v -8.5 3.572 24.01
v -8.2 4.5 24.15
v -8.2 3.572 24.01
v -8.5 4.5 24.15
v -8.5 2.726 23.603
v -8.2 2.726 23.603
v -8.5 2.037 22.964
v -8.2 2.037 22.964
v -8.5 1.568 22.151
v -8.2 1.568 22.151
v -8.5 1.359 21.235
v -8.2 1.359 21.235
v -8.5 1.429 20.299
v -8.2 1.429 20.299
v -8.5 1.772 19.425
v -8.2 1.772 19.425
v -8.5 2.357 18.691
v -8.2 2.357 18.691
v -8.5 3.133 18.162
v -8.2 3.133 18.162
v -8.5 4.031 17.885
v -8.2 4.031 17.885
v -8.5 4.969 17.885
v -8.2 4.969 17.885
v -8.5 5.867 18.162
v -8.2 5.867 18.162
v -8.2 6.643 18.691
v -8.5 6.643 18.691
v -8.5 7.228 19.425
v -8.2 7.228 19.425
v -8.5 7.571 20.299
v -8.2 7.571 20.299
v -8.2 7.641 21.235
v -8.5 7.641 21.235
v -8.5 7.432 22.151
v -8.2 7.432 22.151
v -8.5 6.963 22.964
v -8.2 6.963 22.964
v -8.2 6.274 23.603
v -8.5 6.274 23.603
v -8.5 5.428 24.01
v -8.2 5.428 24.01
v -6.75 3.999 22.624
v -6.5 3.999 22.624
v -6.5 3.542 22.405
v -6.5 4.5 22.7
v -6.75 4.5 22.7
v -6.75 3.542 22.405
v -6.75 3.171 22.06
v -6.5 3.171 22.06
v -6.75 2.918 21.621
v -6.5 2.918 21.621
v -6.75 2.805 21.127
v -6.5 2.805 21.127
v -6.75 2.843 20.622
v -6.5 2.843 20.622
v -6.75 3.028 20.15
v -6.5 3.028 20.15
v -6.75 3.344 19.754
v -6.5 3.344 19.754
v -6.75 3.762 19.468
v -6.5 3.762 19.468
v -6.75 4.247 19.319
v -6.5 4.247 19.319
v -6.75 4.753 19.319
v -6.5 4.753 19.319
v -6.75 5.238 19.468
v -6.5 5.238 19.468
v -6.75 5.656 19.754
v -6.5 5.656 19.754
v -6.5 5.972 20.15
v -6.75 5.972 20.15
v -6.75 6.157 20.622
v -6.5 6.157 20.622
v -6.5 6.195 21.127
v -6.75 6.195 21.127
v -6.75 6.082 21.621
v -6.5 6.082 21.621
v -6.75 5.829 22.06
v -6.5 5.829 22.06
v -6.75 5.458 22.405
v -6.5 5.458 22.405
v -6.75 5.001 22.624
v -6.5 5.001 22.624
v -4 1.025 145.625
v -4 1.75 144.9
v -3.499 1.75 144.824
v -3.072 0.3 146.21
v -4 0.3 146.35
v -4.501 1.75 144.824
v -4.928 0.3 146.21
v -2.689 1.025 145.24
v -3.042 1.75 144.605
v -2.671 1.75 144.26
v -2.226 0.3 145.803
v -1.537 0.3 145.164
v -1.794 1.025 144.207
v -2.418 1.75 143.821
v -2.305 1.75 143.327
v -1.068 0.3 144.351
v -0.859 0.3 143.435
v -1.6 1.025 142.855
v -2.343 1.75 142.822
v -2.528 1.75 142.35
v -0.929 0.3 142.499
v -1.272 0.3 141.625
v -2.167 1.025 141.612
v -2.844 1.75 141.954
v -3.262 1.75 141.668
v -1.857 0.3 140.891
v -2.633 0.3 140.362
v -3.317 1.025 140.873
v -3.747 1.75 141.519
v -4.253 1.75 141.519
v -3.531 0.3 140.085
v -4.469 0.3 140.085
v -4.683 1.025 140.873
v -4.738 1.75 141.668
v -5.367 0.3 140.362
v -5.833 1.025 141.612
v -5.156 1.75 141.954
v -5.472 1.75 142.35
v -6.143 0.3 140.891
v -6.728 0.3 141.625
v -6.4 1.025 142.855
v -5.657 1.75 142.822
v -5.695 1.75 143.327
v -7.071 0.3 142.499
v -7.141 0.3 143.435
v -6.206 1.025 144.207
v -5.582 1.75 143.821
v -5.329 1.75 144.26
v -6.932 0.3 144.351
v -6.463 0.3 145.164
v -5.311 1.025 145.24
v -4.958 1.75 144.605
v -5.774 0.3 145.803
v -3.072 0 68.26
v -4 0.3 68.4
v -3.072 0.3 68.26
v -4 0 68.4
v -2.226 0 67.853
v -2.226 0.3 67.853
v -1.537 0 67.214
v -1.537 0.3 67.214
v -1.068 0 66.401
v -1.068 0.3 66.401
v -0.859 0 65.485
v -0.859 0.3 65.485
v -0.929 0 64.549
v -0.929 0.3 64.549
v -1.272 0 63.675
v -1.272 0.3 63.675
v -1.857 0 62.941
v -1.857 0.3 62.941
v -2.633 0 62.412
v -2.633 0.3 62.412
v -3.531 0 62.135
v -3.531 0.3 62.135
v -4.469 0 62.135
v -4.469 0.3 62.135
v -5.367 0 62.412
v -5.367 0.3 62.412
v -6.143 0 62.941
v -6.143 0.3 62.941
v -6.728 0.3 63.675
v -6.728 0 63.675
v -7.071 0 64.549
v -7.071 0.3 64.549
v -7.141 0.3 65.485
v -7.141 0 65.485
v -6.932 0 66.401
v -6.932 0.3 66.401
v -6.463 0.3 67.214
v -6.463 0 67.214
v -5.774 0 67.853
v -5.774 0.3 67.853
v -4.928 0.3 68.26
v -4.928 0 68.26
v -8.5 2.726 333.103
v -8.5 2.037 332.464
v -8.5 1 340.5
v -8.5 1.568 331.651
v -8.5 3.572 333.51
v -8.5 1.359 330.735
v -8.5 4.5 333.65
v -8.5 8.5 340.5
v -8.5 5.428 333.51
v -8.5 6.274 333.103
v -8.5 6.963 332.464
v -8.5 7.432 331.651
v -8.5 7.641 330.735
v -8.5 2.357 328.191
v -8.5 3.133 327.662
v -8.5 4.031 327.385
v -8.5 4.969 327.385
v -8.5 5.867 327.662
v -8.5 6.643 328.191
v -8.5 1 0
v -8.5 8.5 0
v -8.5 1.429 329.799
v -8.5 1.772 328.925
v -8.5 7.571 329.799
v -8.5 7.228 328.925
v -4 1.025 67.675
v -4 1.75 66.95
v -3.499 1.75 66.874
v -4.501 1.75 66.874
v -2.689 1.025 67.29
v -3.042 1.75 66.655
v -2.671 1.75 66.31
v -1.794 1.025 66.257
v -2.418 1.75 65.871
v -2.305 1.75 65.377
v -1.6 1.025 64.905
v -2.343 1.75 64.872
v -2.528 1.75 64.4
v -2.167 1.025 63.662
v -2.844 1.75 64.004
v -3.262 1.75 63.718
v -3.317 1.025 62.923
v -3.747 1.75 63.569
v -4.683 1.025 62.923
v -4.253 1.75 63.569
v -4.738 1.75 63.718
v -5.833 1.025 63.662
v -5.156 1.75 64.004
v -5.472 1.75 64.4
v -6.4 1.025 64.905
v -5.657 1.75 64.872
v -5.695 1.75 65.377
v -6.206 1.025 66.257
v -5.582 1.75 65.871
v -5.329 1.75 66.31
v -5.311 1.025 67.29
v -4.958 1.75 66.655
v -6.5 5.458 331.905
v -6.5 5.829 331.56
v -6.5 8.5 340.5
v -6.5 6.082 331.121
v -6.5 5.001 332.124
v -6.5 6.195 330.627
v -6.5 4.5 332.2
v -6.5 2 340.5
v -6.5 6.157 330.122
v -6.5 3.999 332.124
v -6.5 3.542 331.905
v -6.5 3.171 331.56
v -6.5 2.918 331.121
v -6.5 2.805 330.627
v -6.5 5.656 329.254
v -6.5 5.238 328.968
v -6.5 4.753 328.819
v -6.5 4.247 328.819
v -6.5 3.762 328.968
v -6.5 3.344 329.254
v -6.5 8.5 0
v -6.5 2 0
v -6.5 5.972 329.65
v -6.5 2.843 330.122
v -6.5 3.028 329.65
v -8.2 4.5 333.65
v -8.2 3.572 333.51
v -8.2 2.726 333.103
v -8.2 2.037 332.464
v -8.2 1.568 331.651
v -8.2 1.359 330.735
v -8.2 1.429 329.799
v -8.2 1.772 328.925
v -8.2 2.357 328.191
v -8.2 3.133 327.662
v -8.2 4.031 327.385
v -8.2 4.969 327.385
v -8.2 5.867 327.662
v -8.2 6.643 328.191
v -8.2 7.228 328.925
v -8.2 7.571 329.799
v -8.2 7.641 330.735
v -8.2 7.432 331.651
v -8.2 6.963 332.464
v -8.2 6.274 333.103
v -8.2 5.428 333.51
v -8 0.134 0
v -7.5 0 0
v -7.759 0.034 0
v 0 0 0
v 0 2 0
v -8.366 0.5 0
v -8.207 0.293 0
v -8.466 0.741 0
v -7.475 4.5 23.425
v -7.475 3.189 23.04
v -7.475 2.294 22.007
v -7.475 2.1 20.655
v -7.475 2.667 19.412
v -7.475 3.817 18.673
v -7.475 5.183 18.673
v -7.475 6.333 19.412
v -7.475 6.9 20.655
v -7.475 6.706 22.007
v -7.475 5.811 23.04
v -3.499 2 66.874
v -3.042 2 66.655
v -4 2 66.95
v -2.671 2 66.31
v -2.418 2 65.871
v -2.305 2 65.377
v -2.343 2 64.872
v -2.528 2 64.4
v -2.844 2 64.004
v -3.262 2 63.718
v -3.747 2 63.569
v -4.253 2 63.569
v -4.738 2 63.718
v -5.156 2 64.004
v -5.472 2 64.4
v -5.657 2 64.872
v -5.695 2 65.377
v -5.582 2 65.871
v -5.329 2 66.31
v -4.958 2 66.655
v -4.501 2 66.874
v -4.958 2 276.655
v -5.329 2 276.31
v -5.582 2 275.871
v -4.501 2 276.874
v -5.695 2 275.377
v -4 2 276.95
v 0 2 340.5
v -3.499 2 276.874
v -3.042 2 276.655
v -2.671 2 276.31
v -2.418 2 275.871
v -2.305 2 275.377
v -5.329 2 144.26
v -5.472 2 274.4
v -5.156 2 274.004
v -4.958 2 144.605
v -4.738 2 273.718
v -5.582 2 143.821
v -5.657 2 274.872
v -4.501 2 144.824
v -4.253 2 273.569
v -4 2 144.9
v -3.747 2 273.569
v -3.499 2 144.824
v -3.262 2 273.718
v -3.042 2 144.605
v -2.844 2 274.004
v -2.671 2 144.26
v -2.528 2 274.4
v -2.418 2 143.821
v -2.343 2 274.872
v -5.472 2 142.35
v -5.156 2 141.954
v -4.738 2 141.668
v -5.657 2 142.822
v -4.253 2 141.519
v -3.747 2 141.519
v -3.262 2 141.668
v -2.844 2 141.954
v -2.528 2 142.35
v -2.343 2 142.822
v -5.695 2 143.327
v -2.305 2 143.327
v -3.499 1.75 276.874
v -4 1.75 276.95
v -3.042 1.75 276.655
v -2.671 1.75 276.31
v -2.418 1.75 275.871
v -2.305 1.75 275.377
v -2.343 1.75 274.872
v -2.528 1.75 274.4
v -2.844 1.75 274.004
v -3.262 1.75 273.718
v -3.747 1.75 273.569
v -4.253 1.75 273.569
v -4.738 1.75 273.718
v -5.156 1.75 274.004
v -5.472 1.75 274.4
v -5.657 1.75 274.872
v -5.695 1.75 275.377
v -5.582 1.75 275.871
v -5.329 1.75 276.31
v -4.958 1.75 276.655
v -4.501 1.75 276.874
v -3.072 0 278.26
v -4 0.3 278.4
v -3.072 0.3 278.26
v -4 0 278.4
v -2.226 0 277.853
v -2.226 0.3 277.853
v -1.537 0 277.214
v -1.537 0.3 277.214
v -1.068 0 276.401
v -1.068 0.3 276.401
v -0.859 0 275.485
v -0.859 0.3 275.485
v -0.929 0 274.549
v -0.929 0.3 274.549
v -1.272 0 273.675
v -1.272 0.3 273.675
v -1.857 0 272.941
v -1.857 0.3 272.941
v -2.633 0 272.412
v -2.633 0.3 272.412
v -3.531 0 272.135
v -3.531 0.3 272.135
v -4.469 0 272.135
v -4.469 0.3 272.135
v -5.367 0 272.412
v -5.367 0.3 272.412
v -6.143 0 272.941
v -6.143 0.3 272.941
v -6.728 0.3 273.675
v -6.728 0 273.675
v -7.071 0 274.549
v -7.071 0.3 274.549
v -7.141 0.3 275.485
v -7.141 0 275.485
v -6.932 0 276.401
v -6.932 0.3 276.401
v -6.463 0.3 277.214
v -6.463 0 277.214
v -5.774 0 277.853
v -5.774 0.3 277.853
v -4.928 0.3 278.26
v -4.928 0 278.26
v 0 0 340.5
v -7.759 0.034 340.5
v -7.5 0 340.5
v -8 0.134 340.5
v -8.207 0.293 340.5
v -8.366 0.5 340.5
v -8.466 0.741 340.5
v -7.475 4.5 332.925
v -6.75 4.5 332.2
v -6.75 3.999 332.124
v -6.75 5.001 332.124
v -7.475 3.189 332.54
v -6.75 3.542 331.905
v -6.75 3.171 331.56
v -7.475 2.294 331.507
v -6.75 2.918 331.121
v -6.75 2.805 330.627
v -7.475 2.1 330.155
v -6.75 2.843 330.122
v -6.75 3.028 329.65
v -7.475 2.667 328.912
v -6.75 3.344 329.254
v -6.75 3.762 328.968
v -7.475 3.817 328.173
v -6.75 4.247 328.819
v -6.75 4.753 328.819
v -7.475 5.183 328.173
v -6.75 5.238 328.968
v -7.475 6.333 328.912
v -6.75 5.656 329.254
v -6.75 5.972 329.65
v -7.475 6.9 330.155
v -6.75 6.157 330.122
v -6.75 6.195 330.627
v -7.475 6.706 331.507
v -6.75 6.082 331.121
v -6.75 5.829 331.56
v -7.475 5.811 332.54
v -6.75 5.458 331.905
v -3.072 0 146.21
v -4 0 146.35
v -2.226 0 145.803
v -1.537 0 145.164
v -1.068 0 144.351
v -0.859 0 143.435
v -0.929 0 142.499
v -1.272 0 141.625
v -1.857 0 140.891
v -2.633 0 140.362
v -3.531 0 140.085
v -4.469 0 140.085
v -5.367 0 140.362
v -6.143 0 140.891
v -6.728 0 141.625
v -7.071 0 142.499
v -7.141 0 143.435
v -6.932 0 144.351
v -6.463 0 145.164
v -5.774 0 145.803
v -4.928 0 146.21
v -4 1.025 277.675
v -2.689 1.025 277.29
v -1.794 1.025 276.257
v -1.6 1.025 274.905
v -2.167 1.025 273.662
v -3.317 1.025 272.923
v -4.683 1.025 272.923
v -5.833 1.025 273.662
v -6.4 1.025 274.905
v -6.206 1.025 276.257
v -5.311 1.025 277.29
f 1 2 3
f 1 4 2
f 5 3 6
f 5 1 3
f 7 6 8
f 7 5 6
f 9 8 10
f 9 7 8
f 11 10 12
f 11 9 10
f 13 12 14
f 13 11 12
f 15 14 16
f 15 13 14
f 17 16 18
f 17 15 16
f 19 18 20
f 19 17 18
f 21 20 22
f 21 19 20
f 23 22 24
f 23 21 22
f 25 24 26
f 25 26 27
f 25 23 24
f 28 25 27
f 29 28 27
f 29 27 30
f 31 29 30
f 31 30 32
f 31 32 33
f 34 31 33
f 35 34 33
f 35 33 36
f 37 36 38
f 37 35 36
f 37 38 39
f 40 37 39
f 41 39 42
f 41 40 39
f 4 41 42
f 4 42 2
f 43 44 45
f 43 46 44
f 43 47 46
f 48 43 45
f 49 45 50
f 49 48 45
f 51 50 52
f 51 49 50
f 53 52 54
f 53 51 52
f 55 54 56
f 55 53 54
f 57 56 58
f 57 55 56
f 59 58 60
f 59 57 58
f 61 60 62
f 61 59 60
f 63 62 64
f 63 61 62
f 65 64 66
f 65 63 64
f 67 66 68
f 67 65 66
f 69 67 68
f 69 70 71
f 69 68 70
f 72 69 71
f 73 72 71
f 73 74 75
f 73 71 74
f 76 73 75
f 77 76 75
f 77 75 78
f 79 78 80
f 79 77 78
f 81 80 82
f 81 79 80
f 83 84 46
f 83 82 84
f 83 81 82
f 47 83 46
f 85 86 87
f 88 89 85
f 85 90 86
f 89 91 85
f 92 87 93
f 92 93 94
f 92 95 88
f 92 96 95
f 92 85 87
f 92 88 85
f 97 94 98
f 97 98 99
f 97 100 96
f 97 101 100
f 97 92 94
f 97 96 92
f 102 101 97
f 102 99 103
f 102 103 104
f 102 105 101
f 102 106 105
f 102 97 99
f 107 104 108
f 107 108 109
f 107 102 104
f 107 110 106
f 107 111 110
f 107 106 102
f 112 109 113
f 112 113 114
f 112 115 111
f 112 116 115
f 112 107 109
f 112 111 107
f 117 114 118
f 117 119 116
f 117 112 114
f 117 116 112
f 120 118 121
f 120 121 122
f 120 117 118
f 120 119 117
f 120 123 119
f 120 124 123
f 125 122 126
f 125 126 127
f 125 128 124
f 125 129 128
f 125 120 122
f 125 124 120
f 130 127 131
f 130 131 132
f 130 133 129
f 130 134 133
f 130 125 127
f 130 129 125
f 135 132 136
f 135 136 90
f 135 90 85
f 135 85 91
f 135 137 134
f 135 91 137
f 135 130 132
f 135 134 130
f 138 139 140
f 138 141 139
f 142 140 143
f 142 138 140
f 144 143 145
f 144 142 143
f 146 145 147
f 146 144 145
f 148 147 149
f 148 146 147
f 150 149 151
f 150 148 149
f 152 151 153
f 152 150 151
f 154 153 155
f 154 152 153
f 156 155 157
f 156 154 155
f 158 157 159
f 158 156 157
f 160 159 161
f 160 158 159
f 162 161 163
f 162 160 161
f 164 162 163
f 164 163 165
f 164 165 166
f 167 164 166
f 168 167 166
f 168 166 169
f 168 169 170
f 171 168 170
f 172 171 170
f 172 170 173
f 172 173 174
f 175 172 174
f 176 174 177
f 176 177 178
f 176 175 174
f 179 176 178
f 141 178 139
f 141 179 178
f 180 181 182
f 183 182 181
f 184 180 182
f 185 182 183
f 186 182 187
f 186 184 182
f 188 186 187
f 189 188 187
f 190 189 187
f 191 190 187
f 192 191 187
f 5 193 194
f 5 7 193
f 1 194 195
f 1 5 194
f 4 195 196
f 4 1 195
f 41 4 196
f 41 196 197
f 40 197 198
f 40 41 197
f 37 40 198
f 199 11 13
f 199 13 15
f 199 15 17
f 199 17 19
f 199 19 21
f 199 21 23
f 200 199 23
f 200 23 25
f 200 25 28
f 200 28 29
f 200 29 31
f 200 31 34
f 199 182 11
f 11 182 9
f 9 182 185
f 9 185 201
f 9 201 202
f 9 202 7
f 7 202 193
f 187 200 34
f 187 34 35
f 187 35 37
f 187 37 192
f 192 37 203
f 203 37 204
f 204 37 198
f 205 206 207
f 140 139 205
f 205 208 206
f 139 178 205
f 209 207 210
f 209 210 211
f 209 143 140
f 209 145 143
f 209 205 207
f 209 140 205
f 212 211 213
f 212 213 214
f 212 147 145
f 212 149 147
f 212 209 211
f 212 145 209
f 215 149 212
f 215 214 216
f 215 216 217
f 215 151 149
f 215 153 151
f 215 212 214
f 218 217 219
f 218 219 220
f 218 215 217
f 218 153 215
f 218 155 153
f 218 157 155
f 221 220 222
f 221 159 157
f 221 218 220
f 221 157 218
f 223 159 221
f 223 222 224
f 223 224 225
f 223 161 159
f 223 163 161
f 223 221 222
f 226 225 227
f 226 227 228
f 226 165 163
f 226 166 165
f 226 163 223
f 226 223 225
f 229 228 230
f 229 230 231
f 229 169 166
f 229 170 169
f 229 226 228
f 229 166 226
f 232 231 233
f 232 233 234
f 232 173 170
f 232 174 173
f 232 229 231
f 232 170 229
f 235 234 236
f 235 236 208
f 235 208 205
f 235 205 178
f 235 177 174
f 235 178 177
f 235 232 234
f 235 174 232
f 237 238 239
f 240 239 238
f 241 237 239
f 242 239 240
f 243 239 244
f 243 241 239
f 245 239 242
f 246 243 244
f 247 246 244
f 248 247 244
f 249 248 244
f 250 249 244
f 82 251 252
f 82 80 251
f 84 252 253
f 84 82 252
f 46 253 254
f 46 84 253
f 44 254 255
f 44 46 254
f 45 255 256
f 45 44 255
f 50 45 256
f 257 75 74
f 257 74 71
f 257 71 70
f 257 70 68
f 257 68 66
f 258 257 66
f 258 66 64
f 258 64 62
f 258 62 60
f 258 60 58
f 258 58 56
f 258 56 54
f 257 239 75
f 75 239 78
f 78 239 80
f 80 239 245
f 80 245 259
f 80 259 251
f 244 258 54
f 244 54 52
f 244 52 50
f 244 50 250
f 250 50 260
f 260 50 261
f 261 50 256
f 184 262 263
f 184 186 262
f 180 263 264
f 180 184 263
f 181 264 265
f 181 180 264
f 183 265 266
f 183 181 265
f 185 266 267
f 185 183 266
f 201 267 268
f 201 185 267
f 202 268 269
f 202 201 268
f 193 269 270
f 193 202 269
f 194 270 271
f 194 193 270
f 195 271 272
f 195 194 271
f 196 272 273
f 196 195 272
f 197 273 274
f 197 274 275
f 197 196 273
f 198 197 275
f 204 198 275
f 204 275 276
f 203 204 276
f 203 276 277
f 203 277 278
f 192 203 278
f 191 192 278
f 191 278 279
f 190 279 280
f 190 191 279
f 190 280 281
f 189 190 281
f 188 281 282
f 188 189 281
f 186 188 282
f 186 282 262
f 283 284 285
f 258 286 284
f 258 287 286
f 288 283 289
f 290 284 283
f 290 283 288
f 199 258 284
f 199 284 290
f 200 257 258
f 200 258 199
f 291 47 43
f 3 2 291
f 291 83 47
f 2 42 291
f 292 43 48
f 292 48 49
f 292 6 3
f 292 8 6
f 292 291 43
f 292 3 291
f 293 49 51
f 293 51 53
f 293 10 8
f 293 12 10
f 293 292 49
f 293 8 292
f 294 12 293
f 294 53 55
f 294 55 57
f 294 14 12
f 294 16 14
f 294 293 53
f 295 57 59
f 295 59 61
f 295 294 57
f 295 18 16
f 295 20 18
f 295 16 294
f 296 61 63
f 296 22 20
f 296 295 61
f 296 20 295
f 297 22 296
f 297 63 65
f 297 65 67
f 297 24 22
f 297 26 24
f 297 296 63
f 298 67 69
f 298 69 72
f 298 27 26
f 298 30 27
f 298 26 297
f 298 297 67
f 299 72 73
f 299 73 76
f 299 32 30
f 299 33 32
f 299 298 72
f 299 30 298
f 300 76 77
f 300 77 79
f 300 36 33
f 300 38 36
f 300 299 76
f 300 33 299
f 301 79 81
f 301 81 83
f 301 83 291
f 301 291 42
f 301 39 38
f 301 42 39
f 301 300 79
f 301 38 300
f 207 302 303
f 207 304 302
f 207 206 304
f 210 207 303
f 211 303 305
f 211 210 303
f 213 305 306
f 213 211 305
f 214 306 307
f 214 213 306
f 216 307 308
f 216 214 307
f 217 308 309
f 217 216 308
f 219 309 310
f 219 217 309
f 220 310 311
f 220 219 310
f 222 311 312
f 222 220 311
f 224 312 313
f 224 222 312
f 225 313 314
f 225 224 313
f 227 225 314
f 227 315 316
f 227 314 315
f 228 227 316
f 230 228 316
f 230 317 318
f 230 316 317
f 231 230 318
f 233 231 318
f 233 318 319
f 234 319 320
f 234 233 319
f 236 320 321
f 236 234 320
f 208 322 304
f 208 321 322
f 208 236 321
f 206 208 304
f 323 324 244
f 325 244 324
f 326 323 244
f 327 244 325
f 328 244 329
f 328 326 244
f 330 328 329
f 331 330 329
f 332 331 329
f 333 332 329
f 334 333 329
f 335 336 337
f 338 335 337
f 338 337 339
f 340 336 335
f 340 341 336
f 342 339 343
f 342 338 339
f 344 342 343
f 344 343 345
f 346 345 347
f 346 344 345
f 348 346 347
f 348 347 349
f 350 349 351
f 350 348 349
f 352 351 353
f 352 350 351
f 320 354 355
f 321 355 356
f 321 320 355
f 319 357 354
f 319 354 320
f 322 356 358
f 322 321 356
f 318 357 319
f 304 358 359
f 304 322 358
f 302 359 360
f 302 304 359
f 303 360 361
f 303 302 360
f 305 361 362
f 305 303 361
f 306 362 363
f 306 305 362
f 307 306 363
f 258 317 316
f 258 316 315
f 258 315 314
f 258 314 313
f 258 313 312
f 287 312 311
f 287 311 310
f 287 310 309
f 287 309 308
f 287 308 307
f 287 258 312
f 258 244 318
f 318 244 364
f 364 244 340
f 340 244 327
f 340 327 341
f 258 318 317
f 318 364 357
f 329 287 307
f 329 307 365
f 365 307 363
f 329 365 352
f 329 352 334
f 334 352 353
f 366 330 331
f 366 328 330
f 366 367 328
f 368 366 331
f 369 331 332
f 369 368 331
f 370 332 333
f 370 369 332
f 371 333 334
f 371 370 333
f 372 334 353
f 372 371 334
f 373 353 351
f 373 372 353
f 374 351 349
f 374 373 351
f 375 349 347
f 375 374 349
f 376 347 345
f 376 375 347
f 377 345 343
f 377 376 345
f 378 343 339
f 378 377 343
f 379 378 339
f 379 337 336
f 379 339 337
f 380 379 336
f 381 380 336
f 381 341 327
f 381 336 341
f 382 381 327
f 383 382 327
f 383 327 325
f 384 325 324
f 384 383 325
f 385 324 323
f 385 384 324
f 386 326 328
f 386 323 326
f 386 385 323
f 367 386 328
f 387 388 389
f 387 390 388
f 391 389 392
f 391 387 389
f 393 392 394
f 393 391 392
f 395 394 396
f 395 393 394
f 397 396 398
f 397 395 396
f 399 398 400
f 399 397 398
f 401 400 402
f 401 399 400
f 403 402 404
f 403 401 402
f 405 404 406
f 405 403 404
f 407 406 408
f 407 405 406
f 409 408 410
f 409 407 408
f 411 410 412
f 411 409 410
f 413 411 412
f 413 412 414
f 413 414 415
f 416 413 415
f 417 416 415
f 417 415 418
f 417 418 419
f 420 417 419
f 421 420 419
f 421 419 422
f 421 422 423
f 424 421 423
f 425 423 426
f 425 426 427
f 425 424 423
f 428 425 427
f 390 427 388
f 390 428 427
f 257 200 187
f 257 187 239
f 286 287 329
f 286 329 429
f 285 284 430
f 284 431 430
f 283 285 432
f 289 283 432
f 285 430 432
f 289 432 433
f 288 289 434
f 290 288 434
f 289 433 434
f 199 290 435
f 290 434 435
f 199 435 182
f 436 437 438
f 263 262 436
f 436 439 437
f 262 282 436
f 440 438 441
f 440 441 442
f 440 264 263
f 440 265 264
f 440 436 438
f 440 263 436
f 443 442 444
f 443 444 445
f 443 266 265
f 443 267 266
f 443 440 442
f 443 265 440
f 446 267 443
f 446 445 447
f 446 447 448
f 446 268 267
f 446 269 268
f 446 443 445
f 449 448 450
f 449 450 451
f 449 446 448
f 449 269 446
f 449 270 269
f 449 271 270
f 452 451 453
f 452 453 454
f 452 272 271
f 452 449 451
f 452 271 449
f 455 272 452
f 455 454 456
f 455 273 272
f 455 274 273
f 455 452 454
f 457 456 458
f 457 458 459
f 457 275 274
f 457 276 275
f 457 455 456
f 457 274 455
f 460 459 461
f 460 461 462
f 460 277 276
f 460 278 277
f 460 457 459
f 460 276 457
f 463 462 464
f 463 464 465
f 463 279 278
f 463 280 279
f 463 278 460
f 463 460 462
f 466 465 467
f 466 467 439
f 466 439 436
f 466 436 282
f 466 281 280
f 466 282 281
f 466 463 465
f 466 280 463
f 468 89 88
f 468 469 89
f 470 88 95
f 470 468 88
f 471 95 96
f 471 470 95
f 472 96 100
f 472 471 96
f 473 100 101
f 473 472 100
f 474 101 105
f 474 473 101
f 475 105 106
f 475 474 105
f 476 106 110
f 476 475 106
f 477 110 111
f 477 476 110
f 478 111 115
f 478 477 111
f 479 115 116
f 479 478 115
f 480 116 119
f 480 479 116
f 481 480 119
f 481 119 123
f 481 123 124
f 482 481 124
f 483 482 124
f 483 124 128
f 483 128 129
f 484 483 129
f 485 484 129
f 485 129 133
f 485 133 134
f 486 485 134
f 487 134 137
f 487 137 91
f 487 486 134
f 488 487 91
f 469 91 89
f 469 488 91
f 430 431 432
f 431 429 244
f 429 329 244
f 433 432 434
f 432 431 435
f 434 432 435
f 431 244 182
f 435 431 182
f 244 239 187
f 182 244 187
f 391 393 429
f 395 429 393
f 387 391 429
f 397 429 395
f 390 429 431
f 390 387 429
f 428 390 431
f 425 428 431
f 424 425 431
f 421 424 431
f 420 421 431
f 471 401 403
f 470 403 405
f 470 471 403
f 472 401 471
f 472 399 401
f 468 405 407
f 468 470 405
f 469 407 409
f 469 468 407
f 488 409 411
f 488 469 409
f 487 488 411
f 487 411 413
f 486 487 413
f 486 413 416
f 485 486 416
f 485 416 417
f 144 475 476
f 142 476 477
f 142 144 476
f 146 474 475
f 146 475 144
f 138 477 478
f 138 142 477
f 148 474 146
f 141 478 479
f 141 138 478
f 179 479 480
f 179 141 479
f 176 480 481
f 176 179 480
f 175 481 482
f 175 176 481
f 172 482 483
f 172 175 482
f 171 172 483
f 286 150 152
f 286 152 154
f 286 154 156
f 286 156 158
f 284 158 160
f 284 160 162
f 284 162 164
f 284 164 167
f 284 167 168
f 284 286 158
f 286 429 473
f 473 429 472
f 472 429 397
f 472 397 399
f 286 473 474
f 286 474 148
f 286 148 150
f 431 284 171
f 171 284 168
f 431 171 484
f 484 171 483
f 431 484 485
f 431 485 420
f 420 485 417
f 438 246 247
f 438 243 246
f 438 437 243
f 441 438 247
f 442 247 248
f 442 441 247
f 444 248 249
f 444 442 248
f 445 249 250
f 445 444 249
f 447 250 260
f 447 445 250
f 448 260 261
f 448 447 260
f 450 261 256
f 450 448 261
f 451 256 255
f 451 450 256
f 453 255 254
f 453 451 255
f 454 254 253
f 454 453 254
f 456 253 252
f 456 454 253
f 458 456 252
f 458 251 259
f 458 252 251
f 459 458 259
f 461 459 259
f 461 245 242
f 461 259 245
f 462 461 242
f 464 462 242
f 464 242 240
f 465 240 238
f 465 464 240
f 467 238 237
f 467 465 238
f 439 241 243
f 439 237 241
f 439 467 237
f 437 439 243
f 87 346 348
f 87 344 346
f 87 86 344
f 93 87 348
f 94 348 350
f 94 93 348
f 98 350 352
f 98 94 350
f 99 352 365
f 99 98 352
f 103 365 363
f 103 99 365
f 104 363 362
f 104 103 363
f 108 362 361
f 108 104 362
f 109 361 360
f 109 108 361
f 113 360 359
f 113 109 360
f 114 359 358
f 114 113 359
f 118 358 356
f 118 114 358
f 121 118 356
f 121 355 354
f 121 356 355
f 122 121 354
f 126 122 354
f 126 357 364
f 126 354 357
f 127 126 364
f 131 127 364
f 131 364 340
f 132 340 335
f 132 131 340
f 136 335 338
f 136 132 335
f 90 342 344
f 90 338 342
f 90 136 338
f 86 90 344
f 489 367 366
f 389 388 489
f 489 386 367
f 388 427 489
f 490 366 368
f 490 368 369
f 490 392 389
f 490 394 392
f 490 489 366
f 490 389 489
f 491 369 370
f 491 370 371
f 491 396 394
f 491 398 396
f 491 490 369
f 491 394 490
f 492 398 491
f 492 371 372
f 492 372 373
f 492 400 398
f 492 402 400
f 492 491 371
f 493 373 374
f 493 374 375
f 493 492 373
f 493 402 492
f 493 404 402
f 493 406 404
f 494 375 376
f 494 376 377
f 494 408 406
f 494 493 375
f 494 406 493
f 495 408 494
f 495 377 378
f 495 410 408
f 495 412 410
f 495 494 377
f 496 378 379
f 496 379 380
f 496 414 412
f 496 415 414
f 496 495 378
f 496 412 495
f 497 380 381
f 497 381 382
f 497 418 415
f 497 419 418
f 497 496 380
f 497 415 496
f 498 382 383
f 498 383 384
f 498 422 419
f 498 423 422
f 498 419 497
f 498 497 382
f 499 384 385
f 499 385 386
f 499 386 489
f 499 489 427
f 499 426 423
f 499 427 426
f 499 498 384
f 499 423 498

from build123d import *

# Parameters (mm, degrees)
BOSS_EXTRUDE1_DEPTH = 340.5
FILLET1_R           = 1


with BuildPart() as part:
    # Sketch1 → Boss-Extrude1 (new body)
    with BuildSketch(Plane.XY):
        Polygon((0, 0), (-8.5, 0), (-8.5, 8.5), (-6.5, 8.5), (-6.5, 2), (0, 2), align=None)
    extrude(amount=BOSS_EXTRUDE1_DEPTH)

    # Fillet1
    fillet1_edges = [part.edges().sort_by_distance(p)[0] for p in [
        (-8.5, 0, 170.25),
    ]]
    fillet(fillet1_edges, radius=FILLET1_R)

    # Sketch7 → CSK for M3 Countersunk Flat Head Screw1 (revolve, cut)
    with BuildSketch(Plane(origin=(-8.5, 4.5, 21), x_dir=(0, 0, 1), z_dir=(0, 1, 0))):
        Polygon((0, 0), (0, 10.521463052), (1.7, 9.5), (1.7, 1.75), (3.15, 0.3), (3.15, 0), align=None)
    revolve(axis=Axis((-14.85, 4.5, 21), (1, 0, 0)), mode=Mode.SUBTRACT)

    # Sketch7 at point 2 (carried to point 2, square into its face) → CSK for M3 Countersunk Flat Head Scr 2 (revolve, cut)
    with BuildSketch(Plane(origin=(-4, 0, 65.25), x_dir=(0, 0, 1), z_dir=(-1, 0, 0))):
        Polygon((0, 0), (0, 10.521463052), (1.7, 9.5), (1.7, 1.75), (3.15, 0.3), (3.15, 0), align=None)
    revolve(axis=Axis((-4, -6.35, 65.25), (0, 1, 0)), mode=Mode.SUBTRACT)

    # Sketch7 at point 3 (carried to point 3, square into its face) → CSK for M3 Countersunk Flat Head Scr 3 (revolve, cut)
    with BuildSketch(Plane(origin=(-4, 0, 143.19999924), x_dir=(0, 0, 1), z_dir=(-1, 0, 0))):
        Polygon((0, 0), (0, 10.521463052), (1.7, 9.5), (1.7, 1.75), (3.15, 0.3), (3.15, 0), align=None)
    revolve(axis=Axis((-4, -6.35, 143.19999924), (0, 1, 0)), mode=Mode.SUBTRACT)

    # Sketch7 at point 4 (carried to point 4, square into its face) → CSK for M3 Countersunk Flat Head Scr 4 (revolve, cut)
    with BuildSketch(Plane(origin=(-4, 0, 275.25), x_dir=(0, 0, 1), z_dir=(-1, 0, 0))):
        Polygon((0, 0), (0, 10.521463052), (1.7, 9.5), (1.7, 1.75), (3.15, 0.3), (3.15, 0), align=None)
    revolve(axis=Axis((-4, -6.35, 275.25), (0, 1, 0)), mode=Mode.SUBTRACT)

    # Sketch7 at point 5 (carried to point 5, square into its face) → CSK for M3 Countersunk Flat Head Scr 5 (revolve, cut)
    with BuildSketch(Plane(origin=(-8.5, 4.5, 330.5), x_dir=(0, 0, 1), z_dir=(0, 1, 0))):
        Polygon((0, 0), (0, 10.521463052), (1.7, 9.5), (1.7, 1.75), (3.15, 0.3), (3.15, 0), align=None)
    revolve(axis=Axis((-14.85, 4.5, 330.5), (1, 0, 0)), mode=Mode.SUBTRACT)


solid = part.part
